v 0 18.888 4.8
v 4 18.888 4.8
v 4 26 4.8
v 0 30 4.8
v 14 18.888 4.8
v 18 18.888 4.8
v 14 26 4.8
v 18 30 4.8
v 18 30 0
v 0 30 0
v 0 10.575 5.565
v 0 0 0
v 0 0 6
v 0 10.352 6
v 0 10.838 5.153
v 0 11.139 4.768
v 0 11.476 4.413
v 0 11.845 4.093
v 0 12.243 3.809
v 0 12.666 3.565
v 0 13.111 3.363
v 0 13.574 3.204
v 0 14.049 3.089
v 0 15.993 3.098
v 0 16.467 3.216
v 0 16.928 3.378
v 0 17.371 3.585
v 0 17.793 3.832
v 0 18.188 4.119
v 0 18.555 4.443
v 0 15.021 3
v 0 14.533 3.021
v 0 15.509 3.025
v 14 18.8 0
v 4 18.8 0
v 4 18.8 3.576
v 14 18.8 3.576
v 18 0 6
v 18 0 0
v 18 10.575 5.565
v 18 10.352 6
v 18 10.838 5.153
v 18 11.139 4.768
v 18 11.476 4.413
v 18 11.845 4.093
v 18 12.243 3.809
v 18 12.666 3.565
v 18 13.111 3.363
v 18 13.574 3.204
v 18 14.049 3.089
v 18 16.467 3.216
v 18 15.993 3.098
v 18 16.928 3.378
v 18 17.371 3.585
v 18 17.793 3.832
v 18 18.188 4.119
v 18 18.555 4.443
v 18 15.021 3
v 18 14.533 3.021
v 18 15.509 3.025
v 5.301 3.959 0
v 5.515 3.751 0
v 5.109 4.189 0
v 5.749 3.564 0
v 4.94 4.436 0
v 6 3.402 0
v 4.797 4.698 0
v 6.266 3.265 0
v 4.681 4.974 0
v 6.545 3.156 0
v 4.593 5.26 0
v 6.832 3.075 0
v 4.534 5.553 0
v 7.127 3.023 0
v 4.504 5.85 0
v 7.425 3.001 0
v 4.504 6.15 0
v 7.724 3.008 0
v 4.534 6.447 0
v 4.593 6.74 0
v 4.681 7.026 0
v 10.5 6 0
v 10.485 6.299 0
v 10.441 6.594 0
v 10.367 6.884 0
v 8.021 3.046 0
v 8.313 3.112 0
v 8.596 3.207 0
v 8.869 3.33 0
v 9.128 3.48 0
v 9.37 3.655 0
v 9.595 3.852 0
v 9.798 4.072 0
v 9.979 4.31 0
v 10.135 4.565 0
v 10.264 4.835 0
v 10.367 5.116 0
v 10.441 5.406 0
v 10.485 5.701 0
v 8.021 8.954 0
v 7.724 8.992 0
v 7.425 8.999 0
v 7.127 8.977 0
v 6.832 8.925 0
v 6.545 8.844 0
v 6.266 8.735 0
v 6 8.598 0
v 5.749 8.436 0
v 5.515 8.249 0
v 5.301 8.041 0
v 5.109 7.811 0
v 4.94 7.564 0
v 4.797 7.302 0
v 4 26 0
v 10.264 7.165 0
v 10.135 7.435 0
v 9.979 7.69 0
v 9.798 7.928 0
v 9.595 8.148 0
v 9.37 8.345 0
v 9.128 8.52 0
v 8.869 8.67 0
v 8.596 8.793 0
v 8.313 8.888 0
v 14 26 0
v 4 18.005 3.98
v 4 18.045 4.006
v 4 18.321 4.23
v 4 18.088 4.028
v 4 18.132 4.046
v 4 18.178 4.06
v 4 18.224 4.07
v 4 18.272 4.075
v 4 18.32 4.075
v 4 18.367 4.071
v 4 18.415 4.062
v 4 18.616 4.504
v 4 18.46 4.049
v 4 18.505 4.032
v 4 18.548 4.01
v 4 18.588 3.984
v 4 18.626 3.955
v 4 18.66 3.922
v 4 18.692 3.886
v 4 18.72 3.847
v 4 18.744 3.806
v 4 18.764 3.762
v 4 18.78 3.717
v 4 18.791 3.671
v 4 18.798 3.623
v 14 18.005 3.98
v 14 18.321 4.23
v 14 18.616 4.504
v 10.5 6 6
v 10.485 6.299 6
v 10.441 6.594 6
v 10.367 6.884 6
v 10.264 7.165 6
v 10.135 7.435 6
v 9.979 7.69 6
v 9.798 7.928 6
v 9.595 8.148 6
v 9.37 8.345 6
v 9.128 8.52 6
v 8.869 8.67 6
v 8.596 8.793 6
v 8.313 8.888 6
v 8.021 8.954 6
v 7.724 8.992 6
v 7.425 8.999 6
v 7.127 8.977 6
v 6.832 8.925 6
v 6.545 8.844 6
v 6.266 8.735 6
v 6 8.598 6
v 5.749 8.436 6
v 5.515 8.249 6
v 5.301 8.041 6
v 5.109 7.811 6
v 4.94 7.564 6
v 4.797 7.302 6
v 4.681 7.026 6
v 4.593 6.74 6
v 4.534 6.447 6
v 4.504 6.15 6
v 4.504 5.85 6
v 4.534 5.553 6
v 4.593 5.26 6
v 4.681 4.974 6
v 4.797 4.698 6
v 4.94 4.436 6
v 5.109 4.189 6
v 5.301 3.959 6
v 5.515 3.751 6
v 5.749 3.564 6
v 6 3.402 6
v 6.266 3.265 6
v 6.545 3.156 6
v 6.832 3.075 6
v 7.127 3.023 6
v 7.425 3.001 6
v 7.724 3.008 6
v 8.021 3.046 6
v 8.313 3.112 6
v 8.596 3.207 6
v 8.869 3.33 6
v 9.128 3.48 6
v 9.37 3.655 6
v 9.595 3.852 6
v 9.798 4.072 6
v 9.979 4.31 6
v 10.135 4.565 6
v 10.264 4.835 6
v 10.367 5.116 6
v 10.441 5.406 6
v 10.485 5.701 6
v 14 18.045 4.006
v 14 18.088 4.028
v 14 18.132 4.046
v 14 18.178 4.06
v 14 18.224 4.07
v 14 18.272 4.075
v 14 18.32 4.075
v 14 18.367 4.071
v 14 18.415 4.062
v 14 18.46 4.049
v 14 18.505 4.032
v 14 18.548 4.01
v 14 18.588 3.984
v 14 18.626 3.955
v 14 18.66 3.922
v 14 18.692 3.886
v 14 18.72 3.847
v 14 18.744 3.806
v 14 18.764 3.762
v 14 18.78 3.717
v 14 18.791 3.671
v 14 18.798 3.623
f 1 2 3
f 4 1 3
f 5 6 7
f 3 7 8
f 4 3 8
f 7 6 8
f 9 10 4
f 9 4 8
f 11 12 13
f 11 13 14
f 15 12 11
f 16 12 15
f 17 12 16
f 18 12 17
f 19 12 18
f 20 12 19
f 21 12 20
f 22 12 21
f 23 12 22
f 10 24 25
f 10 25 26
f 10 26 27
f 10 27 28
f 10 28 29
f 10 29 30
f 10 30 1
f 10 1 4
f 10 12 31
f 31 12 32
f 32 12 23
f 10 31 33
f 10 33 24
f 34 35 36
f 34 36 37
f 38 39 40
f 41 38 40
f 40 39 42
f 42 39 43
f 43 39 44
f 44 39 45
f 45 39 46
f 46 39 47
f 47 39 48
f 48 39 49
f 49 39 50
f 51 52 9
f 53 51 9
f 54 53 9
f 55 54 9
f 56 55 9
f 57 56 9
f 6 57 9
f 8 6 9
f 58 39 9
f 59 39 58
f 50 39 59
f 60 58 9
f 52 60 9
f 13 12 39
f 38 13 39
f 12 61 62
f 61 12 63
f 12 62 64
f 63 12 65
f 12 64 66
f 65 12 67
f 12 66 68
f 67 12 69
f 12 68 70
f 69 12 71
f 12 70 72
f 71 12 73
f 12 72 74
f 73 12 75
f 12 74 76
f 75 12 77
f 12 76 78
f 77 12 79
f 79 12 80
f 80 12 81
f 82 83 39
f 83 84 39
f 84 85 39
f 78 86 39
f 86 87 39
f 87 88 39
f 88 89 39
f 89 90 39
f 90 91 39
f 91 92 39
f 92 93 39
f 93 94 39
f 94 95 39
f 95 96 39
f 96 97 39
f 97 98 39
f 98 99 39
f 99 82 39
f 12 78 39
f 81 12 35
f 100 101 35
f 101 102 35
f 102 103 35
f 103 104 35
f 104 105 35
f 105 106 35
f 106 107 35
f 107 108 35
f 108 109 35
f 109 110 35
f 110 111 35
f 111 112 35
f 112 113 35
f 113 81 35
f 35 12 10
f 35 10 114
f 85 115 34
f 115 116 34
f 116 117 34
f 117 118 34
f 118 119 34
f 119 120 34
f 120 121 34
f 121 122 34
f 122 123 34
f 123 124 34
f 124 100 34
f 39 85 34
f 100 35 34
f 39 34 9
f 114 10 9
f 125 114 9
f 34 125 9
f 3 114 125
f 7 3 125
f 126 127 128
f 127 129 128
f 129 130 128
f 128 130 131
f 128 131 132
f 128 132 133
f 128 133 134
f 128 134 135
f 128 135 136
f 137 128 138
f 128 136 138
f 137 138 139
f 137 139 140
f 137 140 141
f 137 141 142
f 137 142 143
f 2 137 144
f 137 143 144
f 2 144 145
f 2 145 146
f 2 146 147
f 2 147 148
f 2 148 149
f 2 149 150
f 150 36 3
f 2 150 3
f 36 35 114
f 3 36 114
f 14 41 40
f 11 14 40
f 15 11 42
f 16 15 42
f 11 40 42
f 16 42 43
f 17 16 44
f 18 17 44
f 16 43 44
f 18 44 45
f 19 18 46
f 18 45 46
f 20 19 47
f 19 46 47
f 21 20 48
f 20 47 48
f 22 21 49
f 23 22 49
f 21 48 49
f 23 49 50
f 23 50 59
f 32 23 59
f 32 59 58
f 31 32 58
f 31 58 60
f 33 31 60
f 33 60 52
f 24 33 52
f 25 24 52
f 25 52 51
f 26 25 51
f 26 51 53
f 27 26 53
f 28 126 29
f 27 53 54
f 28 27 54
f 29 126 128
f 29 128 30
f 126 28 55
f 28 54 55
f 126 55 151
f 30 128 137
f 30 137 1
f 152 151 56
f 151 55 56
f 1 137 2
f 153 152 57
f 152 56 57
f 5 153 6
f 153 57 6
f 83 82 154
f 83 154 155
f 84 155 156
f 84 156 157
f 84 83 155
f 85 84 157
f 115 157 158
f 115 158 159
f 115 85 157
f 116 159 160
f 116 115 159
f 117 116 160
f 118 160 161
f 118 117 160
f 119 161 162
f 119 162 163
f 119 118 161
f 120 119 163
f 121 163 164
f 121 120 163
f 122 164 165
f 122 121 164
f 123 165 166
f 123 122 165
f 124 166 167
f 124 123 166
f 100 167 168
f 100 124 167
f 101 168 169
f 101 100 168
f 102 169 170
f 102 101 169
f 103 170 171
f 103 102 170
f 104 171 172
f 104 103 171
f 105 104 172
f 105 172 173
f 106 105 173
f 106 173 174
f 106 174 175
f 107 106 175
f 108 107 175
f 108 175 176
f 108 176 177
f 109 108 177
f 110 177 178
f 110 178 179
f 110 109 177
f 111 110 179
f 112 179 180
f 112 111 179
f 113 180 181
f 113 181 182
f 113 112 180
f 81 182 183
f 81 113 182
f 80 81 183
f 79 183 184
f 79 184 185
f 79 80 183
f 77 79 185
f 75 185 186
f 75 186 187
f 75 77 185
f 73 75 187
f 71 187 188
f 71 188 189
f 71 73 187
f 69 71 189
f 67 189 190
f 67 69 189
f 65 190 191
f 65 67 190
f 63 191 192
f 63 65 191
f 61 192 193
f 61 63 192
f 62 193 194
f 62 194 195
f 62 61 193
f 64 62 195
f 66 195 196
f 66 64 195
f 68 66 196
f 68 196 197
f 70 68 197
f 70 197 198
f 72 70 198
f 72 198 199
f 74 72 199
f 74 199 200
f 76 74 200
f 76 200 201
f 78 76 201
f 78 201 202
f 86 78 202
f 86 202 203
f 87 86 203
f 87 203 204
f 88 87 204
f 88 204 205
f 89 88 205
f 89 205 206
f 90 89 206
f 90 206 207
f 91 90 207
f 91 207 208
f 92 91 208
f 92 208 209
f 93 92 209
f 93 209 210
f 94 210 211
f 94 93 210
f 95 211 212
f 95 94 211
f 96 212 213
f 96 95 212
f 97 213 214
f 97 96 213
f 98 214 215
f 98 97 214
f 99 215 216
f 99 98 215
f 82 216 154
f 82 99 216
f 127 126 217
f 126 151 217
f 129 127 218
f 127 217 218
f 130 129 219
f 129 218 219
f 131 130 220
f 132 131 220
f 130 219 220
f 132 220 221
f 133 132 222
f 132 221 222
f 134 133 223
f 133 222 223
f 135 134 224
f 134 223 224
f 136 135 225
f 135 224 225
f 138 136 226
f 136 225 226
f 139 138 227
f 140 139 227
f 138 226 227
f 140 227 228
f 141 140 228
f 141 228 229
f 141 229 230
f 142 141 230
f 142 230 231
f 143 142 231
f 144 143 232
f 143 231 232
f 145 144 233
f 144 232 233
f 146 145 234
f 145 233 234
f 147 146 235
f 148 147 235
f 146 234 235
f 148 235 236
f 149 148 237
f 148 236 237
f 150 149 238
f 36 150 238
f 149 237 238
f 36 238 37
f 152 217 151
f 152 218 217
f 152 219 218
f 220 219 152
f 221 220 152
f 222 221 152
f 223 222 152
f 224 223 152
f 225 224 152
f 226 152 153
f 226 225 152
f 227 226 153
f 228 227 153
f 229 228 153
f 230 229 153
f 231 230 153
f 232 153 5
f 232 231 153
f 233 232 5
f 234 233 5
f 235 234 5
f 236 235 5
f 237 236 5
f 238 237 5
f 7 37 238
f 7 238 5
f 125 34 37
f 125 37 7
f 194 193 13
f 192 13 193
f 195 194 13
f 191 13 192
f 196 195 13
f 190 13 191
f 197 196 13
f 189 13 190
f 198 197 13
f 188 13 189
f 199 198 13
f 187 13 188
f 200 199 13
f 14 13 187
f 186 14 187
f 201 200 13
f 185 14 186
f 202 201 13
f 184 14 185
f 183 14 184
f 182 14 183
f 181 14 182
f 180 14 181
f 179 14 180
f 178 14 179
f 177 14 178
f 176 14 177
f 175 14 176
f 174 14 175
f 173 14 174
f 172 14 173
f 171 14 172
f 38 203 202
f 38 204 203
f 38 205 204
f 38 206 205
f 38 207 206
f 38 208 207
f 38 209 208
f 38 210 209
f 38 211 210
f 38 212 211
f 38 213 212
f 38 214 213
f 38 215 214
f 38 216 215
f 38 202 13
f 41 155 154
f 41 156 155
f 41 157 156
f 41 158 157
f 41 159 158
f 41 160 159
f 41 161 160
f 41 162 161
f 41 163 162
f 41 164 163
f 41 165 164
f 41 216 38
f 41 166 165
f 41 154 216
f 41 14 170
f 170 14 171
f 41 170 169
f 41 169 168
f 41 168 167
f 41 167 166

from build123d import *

# Parameters (mm, degrees)
SKETCH1_W           = 18
SKETCH1_H           = 30
SKETCH1_R           = 3
SKETCH1_W_2         = 10
SKETCH1_H_2         = 7.2
BOSS_EXTRUDE1_DEPTH = 6
CUT_EXTRUDE1_DEPTH  = 19
FILLET1_R           = 0.5


with BuildPart() as part:
    # Sketch1 → Boss-Extrude1 (new body)
    with BuildSketch(Plane.XY):
        with Locations((9, 15)):
            Rectangle(SKETCH1_W, SKETCH1_H)
        with Locations((7.5, 6)):
            Circle(SKETCH1_R, mode=Mode.SUBTRACT)
        with Locations((9, 22.4)):
            Rectangle(SKETCH1_W_2, SKETCH1_H_2, mode=Mode.SUBTRACT)
    extrude(amount=BOSS_EXTRUDE1_DEPTH)

    # Sketch2 → Cut-Extrude1 (cut, through all)
    with BuildSketch(Plane(origin=(18, 0, 0), x_dir=(0, 0, -1), z_dir=(1, 0, 0))):
        with BuildLine():
            Line((-4.8, 18.888444419), (-4.8, 30))
            Line((-4.8, 30), (-6, 30))
            Line((-6, 30), (-6, 10.352419985))
            ThreePointArc((-6, 10.352419985), (-3.049660577, 14.29001992), (-4.8, 18.888444419))
        make_face()
    extrude(amount=-CUT_EXTRUDE1_DEPTH, mode=Mode.SUBTRACT)

    # Fillet1
    fillet1_edges = [part.edges().sort_by_distance(p)[0] for p in [
        (9, 18.8, 4.69852973),
    ]]
    fillet(fillet1_edges, radius=FILLET1_R)


solid = part.part
